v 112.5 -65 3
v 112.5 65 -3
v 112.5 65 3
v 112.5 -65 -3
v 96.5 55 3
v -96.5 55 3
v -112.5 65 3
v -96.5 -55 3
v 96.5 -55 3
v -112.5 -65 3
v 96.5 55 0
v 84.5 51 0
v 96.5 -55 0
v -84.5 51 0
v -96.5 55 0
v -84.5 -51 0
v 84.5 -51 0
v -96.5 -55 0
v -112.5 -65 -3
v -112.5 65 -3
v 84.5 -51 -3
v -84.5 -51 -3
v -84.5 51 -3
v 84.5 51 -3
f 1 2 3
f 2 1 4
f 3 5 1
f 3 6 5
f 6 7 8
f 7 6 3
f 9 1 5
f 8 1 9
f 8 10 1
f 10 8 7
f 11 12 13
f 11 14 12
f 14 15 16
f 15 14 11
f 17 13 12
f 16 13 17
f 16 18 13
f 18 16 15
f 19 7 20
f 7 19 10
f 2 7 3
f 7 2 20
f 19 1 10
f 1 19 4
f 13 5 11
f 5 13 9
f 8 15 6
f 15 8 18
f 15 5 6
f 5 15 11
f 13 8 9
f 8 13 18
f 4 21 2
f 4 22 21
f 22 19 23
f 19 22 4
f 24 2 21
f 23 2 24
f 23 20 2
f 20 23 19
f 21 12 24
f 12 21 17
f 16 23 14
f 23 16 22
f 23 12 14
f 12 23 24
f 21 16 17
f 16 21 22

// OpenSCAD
module case_screen_rpi_7inch_type1(CASE_W=225,CASE_L=130,CASE_H=3)
{
    RP3_7INCH_SCREEN_W=193.0;
    RP3_7INCH_SCREEN_L=110.0;
    RP3_7INCH_SCREEN_H=CASE_H+2;
    
    if(CASE_W<RP3_7INCH_SCREEN_W)
    {
    }
    
    if(CASE_L<RP3_7INCH_SCREEN_L)
    {
    }
    
    RP3_7INCH_METAL_W=RP3_7INCH_SCREEN_W-24;
    RP3_7INCH_METAL_L=RP3_7INCH_SCREEN_L-8;
    RP3_7INCH_METAL_H=CASE_H+2;    
    
    color("Black")
    translate([0,0,CASE_H/2])
    difference()
    {
        cube([CASE_W,CASE_L,CASE_H], center=true);
        

        cube([RP3_7INCH_SCREEN_W,RP3_7INCH_SCREEN_L,RP3_7INCH_SCREEN_H], center=true);
    }

    

    
    color("Silver")
    translate([0,0,-CASE_H/2])
    difference()
    {
        cube([CASE_W,CASE_L,CASE_H], center=true);
        
        cube([RP3_7INCH_METAL_W,RP3_7INCH_METAL_L,RP3_7INCH_METAL_H], center=true);
    }
}

case_screen_rpi_7inch_type1();
